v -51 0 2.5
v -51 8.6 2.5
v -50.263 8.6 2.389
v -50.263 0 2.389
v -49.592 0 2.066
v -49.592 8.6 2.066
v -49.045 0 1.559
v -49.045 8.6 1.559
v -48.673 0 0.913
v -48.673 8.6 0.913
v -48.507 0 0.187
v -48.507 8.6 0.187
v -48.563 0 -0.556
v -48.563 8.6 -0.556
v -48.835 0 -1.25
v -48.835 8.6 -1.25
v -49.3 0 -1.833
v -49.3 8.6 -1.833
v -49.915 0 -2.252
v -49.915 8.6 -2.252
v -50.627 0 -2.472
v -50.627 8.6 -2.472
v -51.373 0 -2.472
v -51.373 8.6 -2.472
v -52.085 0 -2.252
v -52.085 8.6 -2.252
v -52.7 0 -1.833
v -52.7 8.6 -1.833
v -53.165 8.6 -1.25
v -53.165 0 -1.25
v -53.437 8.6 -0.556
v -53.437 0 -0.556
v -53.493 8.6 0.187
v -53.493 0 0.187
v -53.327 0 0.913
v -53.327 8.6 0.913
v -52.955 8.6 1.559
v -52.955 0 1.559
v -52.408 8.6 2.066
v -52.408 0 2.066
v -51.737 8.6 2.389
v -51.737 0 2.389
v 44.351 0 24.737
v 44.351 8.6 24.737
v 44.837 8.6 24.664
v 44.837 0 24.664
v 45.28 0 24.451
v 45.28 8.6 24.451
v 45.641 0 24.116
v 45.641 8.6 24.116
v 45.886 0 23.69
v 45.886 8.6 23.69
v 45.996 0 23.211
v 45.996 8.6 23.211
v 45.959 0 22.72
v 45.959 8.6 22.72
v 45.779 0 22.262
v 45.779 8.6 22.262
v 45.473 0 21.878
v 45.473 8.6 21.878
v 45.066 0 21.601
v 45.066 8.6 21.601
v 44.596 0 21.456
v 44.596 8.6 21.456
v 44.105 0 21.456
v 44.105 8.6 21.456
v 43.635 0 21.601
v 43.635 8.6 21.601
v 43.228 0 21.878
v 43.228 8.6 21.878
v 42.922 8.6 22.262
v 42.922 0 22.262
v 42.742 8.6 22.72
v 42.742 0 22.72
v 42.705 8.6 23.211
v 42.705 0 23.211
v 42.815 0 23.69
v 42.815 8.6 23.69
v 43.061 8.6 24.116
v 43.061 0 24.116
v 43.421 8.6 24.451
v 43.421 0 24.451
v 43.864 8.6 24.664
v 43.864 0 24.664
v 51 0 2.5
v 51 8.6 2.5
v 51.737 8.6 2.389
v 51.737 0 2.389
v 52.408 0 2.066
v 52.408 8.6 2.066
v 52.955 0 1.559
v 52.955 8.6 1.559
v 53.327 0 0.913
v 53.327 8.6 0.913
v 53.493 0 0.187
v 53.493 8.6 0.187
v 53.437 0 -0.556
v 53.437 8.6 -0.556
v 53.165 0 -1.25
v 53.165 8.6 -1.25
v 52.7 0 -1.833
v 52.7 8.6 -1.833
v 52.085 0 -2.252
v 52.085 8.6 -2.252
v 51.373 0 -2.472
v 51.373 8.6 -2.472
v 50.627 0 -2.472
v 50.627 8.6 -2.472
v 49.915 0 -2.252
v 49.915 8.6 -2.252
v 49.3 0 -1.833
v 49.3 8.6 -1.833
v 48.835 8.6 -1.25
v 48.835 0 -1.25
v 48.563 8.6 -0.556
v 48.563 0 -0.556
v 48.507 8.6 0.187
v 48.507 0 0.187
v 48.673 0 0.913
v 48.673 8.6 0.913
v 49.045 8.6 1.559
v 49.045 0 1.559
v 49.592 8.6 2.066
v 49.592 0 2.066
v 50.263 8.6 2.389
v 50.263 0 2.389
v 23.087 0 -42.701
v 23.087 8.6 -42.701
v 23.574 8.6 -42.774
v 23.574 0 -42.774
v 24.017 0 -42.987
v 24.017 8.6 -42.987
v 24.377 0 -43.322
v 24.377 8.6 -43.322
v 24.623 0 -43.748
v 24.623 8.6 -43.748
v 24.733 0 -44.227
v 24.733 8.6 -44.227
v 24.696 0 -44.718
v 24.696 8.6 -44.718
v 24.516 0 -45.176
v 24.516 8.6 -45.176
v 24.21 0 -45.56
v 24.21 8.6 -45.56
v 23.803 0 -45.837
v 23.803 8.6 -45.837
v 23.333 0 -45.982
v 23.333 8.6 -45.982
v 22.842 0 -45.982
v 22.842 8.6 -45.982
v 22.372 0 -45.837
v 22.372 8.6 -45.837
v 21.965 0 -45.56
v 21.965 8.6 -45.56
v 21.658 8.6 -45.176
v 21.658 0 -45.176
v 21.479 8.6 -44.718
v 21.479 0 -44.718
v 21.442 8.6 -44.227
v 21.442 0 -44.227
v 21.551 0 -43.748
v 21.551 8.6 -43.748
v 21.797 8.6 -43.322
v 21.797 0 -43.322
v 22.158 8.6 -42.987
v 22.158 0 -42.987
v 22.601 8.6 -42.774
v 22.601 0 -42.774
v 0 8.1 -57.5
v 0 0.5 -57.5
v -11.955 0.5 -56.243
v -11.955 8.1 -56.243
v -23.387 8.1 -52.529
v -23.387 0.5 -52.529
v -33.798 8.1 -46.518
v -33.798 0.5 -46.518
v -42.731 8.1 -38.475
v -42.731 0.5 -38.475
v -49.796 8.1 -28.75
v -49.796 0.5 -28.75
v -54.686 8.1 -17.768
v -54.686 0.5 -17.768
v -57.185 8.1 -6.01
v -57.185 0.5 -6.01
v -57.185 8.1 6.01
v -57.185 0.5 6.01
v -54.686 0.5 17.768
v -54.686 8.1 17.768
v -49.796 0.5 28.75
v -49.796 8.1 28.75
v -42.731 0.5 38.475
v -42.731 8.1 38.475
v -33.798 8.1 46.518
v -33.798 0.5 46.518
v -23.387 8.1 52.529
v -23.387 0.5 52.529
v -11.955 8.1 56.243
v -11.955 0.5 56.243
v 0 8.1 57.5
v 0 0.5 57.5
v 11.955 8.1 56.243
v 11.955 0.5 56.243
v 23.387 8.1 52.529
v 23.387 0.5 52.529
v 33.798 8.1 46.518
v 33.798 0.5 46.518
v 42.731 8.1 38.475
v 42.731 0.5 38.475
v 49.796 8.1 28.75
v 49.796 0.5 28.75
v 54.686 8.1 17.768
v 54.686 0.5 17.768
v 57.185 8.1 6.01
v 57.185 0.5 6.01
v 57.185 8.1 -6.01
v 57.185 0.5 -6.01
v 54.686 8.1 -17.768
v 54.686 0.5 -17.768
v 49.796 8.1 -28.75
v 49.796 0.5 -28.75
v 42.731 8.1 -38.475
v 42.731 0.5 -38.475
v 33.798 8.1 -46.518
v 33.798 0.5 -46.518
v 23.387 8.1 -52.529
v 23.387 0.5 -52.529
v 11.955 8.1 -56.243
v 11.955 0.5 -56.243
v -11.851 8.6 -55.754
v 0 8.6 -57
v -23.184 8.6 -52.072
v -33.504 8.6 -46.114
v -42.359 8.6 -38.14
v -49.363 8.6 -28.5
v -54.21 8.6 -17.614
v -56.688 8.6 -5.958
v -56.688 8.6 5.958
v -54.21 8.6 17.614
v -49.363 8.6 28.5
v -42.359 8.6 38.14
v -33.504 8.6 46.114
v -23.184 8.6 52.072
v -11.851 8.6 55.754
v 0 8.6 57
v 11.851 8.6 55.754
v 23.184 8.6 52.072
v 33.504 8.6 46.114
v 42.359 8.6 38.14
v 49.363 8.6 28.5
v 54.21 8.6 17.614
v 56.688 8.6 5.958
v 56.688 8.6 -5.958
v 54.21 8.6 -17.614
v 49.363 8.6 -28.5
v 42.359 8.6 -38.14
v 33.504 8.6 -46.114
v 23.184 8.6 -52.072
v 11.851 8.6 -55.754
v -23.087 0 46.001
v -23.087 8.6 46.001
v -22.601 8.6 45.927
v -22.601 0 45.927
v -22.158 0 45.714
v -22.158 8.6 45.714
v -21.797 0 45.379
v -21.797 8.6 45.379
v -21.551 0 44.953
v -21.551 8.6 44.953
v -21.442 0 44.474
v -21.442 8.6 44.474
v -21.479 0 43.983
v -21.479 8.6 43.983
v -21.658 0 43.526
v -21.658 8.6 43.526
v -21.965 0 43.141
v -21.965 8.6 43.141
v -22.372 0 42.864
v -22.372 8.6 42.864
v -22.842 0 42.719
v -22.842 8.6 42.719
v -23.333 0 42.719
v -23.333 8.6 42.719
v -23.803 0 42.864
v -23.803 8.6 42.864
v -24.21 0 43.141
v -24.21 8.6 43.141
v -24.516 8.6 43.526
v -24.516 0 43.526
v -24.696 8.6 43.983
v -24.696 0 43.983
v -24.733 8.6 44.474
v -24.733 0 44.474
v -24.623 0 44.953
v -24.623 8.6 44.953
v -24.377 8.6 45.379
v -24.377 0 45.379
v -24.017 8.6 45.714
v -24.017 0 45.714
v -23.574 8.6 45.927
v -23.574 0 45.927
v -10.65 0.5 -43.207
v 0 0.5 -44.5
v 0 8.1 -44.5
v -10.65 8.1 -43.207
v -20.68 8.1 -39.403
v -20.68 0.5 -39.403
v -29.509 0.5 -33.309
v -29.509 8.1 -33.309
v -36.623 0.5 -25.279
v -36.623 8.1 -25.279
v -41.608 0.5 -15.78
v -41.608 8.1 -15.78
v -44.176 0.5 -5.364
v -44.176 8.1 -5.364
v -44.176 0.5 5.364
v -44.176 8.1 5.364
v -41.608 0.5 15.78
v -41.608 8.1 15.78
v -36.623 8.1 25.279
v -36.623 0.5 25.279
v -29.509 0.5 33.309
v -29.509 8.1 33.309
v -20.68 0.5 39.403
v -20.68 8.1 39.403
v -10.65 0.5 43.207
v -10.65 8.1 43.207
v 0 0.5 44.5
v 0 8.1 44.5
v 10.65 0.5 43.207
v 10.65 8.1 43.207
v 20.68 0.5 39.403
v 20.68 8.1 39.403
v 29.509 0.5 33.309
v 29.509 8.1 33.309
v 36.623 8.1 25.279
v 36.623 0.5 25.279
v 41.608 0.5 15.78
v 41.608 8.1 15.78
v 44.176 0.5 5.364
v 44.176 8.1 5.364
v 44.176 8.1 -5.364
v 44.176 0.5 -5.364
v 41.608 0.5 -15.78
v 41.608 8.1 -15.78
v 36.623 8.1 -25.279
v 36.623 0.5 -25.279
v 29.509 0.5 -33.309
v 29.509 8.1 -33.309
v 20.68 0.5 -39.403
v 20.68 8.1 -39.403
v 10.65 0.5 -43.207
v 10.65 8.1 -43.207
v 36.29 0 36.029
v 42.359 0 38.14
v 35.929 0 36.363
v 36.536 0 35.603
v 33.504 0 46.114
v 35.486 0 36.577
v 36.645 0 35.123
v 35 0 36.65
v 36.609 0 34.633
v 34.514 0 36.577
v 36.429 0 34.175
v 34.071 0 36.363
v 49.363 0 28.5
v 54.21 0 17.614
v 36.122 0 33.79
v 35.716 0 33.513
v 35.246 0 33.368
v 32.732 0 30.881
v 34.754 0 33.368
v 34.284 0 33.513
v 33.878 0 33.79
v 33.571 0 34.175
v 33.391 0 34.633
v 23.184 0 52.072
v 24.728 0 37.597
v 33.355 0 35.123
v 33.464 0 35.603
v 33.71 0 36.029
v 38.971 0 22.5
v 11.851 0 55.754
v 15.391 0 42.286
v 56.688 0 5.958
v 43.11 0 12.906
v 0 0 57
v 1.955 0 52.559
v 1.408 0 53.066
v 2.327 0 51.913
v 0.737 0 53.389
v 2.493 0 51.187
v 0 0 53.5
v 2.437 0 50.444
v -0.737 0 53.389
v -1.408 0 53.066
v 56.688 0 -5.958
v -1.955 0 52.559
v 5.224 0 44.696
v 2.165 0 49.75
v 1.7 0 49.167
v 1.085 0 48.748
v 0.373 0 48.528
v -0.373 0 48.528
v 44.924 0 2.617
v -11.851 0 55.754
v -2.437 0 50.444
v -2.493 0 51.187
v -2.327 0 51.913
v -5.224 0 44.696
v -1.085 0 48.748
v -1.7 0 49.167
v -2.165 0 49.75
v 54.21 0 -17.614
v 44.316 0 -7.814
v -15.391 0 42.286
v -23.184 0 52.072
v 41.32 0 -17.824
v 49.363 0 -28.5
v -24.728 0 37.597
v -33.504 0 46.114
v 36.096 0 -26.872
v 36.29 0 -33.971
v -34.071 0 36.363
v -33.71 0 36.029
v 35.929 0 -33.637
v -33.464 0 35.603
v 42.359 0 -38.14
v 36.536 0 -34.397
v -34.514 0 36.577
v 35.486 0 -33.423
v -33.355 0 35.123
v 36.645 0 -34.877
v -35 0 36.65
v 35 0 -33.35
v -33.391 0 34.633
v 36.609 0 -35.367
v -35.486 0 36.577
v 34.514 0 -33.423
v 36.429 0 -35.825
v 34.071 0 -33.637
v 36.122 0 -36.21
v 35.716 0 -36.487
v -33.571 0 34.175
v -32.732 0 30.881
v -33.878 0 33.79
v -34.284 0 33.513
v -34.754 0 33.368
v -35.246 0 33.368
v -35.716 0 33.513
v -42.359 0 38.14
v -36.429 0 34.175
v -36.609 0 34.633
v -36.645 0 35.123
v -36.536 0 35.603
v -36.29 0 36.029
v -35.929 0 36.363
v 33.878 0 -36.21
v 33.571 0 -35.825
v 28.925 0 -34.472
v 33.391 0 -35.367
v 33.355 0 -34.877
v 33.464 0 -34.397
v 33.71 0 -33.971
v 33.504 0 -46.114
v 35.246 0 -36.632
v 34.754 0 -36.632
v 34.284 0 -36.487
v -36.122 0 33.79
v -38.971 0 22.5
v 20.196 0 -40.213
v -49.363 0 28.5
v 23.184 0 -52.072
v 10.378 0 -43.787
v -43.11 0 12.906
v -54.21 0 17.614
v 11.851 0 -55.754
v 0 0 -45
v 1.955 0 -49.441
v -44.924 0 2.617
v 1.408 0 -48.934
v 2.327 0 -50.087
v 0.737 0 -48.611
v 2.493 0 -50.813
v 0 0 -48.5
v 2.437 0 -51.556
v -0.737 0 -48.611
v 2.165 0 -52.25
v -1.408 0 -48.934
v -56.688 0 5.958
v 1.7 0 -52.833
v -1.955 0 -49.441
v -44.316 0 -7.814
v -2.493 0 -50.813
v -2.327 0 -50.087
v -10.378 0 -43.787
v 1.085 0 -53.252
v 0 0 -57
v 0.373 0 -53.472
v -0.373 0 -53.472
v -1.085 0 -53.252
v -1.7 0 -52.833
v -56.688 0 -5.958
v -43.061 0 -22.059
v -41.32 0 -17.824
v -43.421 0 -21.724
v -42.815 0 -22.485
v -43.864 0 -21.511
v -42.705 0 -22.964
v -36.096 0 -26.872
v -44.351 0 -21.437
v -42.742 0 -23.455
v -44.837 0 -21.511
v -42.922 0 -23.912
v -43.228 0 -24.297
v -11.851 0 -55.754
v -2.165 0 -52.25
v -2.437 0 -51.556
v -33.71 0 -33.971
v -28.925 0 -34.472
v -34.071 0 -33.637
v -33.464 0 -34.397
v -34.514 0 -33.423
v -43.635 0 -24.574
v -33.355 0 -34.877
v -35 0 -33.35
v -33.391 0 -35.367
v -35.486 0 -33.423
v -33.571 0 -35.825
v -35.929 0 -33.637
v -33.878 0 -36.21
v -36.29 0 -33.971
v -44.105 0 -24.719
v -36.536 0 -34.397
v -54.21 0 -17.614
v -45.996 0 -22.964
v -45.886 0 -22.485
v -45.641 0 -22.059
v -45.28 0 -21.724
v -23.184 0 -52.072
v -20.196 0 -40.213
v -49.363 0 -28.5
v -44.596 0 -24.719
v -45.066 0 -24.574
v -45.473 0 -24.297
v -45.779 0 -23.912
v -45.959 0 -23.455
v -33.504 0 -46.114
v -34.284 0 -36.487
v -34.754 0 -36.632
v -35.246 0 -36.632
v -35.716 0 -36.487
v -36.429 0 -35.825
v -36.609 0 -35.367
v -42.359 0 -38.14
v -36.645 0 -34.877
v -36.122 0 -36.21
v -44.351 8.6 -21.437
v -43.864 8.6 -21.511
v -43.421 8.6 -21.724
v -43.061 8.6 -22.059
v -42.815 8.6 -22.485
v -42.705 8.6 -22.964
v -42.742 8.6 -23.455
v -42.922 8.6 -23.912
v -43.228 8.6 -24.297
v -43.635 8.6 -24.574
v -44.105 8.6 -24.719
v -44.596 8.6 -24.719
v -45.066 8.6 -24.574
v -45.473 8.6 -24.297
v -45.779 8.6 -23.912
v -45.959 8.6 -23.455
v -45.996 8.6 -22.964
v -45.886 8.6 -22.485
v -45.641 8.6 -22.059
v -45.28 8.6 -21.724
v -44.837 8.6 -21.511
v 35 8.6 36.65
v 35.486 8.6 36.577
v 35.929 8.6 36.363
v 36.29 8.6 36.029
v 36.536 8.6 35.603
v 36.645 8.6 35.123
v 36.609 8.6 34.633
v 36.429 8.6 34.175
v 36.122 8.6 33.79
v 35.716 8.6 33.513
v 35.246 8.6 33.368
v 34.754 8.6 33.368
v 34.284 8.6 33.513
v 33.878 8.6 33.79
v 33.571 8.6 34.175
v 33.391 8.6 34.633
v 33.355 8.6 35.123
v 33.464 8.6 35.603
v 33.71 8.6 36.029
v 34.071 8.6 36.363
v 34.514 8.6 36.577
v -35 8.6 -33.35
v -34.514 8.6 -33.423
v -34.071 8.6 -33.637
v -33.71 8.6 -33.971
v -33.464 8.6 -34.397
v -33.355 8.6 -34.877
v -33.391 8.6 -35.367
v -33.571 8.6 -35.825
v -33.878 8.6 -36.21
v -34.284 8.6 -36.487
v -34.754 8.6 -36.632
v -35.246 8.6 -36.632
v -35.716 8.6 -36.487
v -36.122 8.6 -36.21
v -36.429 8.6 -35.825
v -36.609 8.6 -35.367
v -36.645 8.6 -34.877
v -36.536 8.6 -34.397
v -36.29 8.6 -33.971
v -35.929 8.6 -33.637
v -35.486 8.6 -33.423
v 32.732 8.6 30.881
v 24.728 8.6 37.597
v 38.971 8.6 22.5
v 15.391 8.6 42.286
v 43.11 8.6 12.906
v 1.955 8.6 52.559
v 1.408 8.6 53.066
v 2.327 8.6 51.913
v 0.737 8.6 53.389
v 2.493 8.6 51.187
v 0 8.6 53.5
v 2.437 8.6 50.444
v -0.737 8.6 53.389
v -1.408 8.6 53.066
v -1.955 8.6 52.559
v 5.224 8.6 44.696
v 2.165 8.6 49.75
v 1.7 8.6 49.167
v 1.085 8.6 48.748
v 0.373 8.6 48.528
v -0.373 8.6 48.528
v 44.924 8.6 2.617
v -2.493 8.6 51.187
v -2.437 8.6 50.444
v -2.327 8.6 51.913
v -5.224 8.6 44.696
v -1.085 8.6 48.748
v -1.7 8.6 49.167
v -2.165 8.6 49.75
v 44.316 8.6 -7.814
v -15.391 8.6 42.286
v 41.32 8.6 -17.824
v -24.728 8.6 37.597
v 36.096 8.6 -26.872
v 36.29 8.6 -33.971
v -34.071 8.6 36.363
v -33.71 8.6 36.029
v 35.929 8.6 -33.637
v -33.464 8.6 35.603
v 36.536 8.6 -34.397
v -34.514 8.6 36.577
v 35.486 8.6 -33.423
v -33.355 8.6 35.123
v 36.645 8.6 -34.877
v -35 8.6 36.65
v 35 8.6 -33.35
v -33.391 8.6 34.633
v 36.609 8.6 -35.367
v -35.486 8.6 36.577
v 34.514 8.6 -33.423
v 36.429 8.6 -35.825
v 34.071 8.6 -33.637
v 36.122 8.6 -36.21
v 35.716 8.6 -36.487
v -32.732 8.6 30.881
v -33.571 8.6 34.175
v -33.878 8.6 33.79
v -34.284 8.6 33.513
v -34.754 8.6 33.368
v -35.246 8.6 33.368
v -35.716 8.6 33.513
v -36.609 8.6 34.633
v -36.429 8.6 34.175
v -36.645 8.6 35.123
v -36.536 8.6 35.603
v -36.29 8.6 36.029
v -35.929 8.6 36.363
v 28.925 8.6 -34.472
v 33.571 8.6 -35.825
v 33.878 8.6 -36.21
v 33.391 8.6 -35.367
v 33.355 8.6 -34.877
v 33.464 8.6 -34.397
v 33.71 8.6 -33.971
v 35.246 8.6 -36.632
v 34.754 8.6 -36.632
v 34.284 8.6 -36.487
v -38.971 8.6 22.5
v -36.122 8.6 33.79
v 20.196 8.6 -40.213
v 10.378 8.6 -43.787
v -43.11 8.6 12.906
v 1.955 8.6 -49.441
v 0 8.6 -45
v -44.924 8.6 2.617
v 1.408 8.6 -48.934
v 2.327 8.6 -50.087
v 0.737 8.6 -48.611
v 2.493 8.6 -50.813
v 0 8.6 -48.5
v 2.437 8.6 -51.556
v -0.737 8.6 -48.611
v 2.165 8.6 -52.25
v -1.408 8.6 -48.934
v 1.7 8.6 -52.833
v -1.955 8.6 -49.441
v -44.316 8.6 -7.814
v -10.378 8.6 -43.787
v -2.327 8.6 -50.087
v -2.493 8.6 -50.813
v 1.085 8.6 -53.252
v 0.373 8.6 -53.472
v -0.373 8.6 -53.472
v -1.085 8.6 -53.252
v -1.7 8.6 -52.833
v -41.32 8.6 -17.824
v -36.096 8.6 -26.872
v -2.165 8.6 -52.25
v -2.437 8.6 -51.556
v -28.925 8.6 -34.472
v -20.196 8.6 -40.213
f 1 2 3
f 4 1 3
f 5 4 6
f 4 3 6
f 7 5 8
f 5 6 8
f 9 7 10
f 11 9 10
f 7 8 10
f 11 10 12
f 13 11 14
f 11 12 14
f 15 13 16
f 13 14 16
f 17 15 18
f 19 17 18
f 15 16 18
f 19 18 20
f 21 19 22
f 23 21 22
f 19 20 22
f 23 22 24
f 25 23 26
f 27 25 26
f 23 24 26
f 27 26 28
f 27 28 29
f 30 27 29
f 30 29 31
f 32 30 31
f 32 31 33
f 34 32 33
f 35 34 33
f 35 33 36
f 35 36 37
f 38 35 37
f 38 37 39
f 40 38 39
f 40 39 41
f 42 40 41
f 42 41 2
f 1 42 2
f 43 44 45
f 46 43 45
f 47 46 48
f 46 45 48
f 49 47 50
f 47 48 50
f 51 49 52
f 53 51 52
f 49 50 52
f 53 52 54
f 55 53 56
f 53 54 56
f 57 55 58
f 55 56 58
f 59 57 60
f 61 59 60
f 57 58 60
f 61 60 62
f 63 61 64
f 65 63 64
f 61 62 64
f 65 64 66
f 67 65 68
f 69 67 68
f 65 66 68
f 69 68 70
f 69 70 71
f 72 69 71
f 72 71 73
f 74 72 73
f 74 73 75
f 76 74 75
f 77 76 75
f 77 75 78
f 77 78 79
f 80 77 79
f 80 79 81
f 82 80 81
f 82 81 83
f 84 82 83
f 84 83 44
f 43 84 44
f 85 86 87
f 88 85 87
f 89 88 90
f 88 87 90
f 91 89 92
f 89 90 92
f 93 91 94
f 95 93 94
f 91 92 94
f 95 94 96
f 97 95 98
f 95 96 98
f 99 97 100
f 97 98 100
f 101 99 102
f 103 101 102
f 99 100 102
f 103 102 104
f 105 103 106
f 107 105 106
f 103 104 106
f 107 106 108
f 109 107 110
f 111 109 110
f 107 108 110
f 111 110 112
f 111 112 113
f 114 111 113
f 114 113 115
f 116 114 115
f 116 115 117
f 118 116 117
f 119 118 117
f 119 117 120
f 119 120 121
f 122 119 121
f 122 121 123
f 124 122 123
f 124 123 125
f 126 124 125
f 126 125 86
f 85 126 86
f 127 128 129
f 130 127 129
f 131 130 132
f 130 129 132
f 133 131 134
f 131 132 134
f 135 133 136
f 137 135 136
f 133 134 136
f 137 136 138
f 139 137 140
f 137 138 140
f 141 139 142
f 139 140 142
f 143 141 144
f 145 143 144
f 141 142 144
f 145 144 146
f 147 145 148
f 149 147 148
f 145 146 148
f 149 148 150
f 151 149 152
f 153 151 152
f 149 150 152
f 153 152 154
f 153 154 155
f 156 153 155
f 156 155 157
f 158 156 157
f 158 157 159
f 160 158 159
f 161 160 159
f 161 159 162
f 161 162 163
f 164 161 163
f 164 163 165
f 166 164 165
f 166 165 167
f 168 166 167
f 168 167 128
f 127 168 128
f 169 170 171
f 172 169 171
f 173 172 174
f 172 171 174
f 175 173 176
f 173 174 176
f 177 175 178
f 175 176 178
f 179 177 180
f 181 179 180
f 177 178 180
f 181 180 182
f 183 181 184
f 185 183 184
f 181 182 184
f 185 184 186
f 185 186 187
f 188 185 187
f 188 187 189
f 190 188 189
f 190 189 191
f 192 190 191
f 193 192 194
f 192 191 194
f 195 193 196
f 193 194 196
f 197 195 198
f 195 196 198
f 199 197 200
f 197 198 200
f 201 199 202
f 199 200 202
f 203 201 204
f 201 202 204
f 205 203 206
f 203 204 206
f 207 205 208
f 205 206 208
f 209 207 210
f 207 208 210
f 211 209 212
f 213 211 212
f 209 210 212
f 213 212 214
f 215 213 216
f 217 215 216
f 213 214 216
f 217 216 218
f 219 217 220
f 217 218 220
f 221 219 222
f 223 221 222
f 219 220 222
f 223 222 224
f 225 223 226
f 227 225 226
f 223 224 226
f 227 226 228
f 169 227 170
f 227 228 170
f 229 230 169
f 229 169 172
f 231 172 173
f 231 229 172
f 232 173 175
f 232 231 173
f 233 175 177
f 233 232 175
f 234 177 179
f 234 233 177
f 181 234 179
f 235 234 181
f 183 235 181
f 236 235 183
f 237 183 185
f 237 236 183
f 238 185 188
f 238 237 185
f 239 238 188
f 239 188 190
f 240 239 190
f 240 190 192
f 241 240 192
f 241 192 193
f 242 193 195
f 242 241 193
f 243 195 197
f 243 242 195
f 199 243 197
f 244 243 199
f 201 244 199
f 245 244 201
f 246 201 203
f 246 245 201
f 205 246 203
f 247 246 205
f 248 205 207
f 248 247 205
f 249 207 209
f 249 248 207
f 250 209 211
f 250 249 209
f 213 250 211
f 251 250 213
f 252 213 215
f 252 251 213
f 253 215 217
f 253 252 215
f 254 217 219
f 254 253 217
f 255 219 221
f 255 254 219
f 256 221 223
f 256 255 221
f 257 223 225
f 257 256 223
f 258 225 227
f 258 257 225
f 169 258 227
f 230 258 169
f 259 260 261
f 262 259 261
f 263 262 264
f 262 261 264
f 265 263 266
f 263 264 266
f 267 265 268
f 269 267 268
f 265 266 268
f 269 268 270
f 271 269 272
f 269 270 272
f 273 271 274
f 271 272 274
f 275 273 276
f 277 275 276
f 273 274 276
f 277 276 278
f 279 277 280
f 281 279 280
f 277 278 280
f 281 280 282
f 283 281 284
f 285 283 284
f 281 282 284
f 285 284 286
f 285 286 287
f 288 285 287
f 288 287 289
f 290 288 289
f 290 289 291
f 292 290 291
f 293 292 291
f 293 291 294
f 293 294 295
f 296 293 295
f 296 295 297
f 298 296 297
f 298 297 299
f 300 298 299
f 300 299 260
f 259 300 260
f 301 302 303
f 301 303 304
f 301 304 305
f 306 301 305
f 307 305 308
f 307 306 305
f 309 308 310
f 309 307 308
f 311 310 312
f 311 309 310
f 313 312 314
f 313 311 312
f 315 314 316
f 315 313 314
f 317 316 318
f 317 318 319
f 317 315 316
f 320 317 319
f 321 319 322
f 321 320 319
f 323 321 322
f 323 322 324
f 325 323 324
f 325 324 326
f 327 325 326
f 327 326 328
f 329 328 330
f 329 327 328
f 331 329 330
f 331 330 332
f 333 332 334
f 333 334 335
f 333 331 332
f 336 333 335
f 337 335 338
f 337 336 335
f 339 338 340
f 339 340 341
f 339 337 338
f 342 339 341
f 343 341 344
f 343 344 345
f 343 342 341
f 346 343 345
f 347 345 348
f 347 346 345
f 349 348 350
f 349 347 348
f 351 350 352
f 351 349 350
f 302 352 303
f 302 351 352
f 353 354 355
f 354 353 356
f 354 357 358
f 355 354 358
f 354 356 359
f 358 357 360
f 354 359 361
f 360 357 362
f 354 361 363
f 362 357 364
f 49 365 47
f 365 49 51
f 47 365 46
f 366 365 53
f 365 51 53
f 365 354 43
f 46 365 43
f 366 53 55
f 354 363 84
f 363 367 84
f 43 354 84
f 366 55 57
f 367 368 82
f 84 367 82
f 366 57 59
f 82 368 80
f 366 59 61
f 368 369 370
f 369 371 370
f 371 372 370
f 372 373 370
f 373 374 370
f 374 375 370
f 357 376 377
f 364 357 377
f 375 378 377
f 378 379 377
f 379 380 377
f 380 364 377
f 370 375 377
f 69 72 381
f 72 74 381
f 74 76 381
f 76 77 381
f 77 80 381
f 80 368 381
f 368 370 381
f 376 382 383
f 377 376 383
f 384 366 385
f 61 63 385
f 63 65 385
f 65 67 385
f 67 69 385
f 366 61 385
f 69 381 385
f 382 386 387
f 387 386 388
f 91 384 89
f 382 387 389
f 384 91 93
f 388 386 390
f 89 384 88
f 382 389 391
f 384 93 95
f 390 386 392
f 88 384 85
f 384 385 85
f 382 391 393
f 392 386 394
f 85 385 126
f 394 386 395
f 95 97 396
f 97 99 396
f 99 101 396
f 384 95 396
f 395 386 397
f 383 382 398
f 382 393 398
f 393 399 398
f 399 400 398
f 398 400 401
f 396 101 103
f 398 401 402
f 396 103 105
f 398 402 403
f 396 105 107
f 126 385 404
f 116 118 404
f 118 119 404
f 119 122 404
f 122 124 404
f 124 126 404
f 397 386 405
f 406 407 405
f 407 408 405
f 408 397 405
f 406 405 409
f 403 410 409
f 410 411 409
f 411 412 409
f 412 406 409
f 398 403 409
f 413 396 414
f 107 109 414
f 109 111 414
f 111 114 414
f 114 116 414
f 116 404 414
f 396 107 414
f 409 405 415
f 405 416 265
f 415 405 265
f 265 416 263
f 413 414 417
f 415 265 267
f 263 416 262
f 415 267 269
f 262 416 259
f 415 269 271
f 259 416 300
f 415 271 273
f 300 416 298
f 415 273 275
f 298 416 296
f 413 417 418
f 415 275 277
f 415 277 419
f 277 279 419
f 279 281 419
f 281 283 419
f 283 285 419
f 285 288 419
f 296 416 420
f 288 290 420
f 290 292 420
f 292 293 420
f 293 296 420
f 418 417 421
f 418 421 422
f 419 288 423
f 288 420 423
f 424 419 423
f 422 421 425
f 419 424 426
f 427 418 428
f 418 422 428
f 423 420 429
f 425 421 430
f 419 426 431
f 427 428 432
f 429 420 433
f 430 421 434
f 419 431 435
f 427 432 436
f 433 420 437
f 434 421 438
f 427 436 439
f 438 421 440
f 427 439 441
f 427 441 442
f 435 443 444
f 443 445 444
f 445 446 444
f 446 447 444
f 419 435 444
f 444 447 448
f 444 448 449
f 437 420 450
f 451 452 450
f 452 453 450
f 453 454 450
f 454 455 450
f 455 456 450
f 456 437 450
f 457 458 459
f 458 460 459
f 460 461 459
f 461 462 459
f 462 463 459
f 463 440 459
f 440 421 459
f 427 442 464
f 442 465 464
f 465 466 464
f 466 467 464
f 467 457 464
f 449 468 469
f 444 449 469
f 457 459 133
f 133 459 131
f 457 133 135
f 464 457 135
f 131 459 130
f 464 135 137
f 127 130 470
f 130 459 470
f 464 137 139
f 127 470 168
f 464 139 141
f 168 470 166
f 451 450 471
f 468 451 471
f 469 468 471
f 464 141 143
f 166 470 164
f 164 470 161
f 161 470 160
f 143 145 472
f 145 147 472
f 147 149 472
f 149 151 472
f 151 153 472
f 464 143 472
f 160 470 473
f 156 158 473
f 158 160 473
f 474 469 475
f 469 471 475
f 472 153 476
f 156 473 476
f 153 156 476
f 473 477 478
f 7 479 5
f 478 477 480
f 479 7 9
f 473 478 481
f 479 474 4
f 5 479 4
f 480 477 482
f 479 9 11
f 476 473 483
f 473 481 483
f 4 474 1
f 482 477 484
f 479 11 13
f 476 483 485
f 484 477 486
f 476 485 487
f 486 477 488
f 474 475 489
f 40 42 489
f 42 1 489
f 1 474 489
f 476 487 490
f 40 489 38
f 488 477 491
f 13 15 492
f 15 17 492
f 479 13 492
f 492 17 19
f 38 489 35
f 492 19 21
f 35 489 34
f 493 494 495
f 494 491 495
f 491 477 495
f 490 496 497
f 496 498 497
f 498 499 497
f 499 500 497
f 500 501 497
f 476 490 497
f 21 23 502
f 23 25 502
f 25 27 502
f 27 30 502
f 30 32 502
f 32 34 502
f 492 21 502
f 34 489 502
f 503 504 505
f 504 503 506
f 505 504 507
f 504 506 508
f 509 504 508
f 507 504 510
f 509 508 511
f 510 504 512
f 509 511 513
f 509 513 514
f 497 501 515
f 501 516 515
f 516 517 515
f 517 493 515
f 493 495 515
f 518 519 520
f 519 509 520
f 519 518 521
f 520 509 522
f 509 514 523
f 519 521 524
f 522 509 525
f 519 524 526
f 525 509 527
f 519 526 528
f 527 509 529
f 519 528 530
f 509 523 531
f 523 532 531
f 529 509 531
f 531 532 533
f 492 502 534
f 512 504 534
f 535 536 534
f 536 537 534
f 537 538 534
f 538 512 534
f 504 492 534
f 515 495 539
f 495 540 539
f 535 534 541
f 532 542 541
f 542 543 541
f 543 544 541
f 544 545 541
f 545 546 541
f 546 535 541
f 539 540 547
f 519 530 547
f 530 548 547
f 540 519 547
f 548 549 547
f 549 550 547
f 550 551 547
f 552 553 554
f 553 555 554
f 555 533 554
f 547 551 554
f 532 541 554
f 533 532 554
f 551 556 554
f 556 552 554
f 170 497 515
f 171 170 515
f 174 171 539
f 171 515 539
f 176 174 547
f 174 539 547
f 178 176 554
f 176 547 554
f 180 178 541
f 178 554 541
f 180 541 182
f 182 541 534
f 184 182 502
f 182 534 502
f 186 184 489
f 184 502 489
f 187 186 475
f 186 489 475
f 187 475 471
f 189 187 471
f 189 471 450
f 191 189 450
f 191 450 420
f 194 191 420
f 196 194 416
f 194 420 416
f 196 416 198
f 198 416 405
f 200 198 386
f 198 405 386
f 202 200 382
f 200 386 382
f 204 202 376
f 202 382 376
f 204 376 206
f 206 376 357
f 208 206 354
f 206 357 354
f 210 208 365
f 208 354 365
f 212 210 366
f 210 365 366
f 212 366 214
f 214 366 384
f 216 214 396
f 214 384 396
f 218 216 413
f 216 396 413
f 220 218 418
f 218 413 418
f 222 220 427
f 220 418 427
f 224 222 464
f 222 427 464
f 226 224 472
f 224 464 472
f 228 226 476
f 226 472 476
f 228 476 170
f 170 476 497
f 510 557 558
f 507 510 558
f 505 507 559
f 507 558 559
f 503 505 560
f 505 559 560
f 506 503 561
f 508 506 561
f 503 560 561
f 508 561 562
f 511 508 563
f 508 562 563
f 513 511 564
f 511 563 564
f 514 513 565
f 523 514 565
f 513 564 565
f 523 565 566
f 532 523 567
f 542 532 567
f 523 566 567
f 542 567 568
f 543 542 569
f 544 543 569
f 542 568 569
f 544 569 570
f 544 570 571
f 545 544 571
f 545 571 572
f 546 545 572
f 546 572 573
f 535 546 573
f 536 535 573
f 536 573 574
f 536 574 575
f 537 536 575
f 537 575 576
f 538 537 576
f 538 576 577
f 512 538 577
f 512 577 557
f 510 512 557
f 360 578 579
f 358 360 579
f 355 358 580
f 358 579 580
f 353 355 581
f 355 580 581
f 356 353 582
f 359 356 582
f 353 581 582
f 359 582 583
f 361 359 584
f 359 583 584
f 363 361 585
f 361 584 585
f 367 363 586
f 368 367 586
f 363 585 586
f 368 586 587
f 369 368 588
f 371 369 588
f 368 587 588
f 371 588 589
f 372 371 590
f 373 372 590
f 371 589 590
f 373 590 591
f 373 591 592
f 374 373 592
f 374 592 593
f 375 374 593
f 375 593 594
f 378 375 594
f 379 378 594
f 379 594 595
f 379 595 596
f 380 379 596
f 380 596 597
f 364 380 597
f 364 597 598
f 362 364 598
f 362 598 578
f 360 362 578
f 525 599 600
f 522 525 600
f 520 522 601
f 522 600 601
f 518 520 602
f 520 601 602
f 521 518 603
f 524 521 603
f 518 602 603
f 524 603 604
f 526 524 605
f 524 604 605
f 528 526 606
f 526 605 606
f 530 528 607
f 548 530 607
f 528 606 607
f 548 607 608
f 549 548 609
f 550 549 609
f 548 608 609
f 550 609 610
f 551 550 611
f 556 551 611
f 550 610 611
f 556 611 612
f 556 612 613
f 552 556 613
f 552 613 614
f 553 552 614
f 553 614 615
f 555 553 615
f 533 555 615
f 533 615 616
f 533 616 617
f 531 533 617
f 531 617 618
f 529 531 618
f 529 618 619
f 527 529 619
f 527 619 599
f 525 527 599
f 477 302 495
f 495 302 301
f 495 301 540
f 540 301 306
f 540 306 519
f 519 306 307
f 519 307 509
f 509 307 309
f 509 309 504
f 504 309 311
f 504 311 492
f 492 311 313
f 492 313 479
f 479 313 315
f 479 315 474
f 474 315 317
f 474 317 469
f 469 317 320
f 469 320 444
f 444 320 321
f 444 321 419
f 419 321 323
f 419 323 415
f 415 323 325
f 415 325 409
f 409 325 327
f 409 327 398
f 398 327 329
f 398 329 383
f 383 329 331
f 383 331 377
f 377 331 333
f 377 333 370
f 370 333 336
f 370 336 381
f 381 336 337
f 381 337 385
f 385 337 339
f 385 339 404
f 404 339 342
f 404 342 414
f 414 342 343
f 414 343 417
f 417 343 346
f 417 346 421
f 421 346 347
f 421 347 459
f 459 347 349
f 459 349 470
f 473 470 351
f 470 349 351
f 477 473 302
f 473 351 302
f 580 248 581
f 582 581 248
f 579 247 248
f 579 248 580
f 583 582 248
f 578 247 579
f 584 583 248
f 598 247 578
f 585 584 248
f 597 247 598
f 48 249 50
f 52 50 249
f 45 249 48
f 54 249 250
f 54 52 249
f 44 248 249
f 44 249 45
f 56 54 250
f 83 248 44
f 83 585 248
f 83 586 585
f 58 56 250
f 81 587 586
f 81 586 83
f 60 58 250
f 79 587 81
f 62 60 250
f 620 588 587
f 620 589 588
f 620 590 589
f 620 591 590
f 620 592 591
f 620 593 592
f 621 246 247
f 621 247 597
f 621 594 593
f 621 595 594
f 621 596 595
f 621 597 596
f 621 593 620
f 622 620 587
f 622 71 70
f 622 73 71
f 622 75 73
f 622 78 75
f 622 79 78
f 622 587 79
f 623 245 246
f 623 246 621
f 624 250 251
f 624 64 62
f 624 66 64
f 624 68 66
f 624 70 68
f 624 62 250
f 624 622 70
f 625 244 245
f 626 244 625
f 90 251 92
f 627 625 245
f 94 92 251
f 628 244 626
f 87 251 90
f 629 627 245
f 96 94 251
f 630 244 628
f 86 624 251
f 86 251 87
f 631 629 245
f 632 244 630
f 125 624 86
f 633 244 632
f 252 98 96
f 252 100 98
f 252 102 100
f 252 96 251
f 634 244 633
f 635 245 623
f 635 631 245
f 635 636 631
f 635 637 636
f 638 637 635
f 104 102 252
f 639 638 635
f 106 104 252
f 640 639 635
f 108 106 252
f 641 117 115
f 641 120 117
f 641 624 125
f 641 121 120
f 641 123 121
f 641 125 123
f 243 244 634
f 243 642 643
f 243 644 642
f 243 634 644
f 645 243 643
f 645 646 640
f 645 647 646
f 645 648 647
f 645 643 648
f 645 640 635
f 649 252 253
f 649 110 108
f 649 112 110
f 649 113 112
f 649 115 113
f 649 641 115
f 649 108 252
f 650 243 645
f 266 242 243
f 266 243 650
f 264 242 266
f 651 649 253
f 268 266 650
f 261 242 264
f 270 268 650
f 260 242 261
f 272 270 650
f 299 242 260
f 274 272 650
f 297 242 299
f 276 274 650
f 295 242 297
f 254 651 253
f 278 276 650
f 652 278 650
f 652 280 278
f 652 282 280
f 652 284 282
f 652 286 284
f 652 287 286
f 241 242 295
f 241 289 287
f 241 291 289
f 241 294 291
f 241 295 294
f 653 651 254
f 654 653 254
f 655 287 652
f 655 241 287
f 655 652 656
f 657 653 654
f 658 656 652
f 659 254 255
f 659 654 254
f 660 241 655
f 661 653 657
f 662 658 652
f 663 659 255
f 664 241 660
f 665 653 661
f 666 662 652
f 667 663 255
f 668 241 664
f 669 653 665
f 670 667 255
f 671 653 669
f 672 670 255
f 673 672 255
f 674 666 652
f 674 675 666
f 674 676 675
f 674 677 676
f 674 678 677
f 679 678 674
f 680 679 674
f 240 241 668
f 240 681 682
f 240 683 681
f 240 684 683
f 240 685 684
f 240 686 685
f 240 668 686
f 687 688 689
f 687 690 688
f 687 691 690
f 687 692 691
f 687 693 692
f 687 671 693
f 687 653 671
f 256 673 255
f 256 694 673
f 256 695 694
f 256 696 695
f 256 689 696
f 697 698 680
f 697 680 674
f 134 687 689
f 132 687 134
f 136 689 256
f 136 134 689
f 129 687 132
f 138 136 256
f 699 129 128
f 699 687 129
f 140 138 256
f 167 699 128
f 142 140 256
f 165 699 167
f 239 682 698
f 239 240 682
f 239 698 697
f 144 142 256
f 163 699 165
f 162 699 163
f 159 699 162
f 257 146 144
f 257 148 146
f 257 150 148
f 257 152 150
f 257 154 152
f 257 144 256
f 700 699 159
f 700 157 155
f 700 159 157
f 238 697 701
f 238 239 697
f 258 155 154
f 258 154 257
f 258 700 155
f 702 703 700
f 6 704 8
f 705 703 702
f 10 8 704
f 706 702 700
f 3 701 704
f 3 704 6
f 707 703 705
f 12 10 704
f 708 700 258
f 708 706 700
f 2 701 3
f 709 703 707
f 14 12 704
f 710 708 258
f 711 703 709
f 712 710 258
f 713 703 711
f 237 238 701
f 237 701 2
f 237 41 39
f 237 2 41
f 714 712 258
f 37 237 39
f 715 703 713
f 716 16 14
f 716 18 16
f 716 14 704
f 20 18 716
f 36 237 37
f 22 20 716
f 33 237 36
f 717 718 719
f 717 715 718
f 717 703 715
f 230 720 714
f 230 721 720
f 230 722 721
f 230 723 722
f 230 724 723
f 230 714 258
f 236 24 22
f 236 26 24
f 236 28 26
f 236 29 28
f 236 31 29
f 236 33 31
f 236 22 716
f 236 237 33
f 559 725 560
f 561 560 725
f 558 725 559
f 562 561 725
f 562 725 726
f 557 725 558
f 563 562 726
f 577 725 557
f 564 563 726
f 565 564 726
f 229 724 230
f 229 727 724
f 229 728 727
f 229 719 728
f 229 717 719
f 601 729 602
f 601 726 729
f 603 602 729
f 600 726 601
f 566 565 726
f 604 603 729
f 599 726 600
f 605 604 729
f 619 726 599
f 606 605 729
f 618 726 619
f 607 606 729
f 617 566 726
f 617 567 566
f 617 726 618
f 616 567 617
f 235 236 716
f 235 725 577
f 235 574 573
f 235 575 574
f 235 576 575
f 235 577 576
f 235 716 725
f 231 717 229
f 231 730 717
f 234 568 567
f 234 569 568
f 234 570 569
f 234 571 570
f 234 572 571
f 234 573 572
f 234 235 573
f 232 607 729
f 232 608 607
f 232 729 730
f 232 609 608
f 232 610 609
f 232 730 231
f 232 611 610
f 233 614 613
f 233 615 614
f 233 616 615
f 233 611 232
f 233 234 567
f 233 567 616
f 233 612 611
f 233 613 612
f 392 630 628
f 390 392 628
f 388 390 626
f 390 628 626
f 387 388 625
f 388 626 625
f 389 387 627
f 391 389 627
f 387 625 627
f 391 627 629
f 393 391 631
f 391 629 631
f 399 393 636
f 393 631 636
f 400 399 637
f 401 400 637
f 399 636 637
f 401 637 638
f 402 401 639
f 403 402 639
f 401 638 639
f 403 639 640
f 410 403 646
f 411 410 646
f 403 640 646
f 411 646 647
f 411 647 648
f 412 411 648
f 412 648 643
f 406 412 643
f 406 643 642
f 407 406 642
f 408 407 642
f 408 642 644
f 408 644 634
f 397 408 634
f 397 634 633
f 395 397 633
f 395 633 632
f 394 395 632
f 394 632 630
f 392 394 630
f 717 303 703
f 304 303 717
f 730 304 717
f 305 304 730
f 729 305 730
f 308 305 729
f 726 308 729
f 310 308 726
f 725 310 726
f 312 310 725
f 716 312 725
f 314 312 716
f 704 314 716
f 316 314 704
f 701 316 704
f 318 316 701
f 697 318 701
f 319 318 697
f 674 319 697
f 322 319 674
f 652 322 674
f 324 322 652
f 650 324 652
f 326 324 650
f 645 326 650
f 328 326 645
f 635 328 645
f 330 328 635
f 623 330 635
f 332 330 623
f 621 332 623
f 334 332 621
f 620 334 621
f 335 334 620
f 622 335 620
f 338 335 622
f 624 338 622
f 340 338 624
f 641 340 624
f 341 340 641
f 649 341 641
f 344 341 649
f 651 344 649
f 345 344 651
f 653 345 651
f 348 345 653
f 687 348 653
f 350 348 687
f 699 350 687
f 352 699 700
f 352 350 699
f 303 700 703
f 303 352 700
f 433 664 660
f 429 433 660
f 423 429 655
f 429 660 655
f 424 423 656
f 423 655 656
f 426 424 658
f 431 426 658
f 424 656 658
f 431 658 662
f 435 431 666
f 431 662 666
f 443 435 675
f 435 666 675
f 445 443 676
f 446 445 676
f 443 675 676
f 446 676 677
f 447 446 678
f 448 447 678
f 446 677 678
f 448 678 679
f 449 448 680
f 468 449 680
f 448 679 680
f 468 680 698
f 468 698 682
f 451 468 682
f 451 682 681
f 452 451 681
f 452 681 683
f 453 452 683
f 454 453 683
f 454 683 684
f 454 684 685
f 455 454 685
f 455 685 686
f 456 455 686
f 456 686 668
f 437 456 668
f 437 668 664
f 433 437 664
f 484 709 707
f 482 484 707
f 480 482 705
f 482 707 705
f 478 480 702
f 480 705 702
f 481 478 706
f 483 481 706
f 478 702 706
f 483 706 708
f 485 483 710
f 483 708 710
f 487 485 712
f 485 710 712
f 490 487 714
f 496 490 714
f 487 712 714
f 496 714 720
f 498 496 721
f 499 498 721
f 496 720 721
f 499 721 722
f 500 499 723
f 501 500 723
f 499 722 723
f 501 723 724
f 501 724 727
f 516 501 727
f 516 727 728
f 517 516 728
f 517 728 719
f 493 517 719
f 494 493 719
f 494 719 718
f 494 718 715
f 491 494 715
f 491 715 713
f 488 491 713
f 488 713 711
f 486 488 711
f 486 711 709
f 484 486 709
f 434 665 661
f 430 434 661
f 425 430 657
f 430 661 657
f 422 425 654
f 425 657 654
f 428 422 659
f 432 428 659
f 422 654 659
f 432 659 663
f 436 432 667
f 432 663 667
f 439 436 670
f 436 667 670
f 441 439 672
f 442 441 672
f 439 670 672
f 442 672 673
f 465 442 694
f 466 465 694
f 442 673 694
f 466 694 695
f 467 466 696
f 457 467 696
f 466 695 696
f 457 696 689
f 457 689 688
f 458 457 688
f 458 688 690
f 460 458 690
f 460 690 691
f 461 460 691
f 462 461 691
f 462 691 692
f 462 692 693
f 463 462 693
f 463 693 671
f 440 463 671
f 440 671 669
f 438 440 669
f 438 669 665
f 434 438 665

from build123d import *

# Parameters (mm, degrees)
SKETCH_1_R          = 57.5
SKETCH_1_R_2        = 44.5
EXTRUDE_1_DEPTH     = 8.6
SKETCH_2_R          = 2.5
CUT_EXTRUDE_1_DEPTH = 82.770777176
CHAMFER_1_SIZE      = 0.5
SKETCH_3_R          = 1.65
CUT_EXTRUDE_2_DEPTH = 82.770777176


with BuildPart() as part:
    # ｽｹｯﾁ1 → ﾎﾞｽ - 押し出し1 (new body)
    with BuildSketch(Plane(origin=(0, 0, 0), x_dir=(1, 0, 0), z_dir=(0, 1, 0))):
        with Locations(Location((0, 0, 0), (0, 0, 90))):
            Circle(SKETCH_1_R)
        with Locations(Location((0, 0, 0), (0, 0, 90))):
            Circle(SKETCH_1_R_2, mode=Mode.SUBTRACT)
    extrude(amount=EXTRUDE_1_DEPTH)

    # ｽｹｯﾁ2 → ｶｯﾄ - 押し出し1 (cut, through all)
    with BuildSketch(Plane(origin=(0, 8.6, 0), x_dir=(1, 0, 0), z_dir=(0, 1, 0))):
        with Locations(Location((-51, 0, 0), (0, 0, 270))):
            Circle(SKETCH_2_R)
        with Locations(Location((0, 51, 0), (0, 0, 270))):
            Circle(SKETCH_2_R)
        with Locations(Location((51, 0, 0), (0, 0, 270))):
            Circle(SKETCH_2_R)
        with Locations(Location((0, -51, 0), (0, 0, 270))):
            Circle(SKETCH_2_R)
    extrude(amount=-CUT_EXTRUDE_1_DEPTH, mode=Mode.SUBTRACT)

    # 面取り1
    chamfer_1_edges = [part.edges().sort_by_distance(p)[0] for p in [
        (0, 0, 57.5),
        (0, 8.6, 57.5),
        (0, 0, 44.5),
        (0, 8.6, 44.5),
    ]]
    chamfer(chamfer_1_edges, length=CHAMFER_1_SIZE)

    # ｽｹｯﾁ3 → ｶｯﾄ - 押し出し2 (cut, through all)
    with BuildSketch(Plane(origin=(0, 8.6, 0), x_dir=(1, 0, 0), z_dir=(0, 1, 0))):
        with Locations(Location((-35, 35, 0), (0, 0, 270))):
            Circle(SKETCH_3_R)
        with Locations(Location((-35, -35, 0), (0, 0, 270))):
            Circle(SKETCH_3_R)
        with Locations(Location((35, -35, 0), (0, 0, 270))):
            Circle(SKETCH_3_R)
        with Locations(Location((35, 35, 0), (0, 0, 270))):
            Circle(SKETCH_3_R)
        with Locations(Location((23.087430662, 44.350541659, 0), (0, 0, 270))):
            Circle(SKETCH_3_R)
        with Locations(Location((44.350541659, -23.087430662, 0), (0, 0, 270))):
            Circle(SKETCH_3_R)
        with Locations(Location((-23.087430662, -44.350541659, 0), (0, 0, 270))):
            Circle(SKETCH_3_R)
        with Locations(Location((-44.350541659, 23.087430662, 0), (0, 0, 270))):
            Circle(SKETCH_3_R)
    extrude(amount=-CUT_EXTRUDE_2_DEPTH, mode=Mode.SUBTRACT)


solid = part.part
